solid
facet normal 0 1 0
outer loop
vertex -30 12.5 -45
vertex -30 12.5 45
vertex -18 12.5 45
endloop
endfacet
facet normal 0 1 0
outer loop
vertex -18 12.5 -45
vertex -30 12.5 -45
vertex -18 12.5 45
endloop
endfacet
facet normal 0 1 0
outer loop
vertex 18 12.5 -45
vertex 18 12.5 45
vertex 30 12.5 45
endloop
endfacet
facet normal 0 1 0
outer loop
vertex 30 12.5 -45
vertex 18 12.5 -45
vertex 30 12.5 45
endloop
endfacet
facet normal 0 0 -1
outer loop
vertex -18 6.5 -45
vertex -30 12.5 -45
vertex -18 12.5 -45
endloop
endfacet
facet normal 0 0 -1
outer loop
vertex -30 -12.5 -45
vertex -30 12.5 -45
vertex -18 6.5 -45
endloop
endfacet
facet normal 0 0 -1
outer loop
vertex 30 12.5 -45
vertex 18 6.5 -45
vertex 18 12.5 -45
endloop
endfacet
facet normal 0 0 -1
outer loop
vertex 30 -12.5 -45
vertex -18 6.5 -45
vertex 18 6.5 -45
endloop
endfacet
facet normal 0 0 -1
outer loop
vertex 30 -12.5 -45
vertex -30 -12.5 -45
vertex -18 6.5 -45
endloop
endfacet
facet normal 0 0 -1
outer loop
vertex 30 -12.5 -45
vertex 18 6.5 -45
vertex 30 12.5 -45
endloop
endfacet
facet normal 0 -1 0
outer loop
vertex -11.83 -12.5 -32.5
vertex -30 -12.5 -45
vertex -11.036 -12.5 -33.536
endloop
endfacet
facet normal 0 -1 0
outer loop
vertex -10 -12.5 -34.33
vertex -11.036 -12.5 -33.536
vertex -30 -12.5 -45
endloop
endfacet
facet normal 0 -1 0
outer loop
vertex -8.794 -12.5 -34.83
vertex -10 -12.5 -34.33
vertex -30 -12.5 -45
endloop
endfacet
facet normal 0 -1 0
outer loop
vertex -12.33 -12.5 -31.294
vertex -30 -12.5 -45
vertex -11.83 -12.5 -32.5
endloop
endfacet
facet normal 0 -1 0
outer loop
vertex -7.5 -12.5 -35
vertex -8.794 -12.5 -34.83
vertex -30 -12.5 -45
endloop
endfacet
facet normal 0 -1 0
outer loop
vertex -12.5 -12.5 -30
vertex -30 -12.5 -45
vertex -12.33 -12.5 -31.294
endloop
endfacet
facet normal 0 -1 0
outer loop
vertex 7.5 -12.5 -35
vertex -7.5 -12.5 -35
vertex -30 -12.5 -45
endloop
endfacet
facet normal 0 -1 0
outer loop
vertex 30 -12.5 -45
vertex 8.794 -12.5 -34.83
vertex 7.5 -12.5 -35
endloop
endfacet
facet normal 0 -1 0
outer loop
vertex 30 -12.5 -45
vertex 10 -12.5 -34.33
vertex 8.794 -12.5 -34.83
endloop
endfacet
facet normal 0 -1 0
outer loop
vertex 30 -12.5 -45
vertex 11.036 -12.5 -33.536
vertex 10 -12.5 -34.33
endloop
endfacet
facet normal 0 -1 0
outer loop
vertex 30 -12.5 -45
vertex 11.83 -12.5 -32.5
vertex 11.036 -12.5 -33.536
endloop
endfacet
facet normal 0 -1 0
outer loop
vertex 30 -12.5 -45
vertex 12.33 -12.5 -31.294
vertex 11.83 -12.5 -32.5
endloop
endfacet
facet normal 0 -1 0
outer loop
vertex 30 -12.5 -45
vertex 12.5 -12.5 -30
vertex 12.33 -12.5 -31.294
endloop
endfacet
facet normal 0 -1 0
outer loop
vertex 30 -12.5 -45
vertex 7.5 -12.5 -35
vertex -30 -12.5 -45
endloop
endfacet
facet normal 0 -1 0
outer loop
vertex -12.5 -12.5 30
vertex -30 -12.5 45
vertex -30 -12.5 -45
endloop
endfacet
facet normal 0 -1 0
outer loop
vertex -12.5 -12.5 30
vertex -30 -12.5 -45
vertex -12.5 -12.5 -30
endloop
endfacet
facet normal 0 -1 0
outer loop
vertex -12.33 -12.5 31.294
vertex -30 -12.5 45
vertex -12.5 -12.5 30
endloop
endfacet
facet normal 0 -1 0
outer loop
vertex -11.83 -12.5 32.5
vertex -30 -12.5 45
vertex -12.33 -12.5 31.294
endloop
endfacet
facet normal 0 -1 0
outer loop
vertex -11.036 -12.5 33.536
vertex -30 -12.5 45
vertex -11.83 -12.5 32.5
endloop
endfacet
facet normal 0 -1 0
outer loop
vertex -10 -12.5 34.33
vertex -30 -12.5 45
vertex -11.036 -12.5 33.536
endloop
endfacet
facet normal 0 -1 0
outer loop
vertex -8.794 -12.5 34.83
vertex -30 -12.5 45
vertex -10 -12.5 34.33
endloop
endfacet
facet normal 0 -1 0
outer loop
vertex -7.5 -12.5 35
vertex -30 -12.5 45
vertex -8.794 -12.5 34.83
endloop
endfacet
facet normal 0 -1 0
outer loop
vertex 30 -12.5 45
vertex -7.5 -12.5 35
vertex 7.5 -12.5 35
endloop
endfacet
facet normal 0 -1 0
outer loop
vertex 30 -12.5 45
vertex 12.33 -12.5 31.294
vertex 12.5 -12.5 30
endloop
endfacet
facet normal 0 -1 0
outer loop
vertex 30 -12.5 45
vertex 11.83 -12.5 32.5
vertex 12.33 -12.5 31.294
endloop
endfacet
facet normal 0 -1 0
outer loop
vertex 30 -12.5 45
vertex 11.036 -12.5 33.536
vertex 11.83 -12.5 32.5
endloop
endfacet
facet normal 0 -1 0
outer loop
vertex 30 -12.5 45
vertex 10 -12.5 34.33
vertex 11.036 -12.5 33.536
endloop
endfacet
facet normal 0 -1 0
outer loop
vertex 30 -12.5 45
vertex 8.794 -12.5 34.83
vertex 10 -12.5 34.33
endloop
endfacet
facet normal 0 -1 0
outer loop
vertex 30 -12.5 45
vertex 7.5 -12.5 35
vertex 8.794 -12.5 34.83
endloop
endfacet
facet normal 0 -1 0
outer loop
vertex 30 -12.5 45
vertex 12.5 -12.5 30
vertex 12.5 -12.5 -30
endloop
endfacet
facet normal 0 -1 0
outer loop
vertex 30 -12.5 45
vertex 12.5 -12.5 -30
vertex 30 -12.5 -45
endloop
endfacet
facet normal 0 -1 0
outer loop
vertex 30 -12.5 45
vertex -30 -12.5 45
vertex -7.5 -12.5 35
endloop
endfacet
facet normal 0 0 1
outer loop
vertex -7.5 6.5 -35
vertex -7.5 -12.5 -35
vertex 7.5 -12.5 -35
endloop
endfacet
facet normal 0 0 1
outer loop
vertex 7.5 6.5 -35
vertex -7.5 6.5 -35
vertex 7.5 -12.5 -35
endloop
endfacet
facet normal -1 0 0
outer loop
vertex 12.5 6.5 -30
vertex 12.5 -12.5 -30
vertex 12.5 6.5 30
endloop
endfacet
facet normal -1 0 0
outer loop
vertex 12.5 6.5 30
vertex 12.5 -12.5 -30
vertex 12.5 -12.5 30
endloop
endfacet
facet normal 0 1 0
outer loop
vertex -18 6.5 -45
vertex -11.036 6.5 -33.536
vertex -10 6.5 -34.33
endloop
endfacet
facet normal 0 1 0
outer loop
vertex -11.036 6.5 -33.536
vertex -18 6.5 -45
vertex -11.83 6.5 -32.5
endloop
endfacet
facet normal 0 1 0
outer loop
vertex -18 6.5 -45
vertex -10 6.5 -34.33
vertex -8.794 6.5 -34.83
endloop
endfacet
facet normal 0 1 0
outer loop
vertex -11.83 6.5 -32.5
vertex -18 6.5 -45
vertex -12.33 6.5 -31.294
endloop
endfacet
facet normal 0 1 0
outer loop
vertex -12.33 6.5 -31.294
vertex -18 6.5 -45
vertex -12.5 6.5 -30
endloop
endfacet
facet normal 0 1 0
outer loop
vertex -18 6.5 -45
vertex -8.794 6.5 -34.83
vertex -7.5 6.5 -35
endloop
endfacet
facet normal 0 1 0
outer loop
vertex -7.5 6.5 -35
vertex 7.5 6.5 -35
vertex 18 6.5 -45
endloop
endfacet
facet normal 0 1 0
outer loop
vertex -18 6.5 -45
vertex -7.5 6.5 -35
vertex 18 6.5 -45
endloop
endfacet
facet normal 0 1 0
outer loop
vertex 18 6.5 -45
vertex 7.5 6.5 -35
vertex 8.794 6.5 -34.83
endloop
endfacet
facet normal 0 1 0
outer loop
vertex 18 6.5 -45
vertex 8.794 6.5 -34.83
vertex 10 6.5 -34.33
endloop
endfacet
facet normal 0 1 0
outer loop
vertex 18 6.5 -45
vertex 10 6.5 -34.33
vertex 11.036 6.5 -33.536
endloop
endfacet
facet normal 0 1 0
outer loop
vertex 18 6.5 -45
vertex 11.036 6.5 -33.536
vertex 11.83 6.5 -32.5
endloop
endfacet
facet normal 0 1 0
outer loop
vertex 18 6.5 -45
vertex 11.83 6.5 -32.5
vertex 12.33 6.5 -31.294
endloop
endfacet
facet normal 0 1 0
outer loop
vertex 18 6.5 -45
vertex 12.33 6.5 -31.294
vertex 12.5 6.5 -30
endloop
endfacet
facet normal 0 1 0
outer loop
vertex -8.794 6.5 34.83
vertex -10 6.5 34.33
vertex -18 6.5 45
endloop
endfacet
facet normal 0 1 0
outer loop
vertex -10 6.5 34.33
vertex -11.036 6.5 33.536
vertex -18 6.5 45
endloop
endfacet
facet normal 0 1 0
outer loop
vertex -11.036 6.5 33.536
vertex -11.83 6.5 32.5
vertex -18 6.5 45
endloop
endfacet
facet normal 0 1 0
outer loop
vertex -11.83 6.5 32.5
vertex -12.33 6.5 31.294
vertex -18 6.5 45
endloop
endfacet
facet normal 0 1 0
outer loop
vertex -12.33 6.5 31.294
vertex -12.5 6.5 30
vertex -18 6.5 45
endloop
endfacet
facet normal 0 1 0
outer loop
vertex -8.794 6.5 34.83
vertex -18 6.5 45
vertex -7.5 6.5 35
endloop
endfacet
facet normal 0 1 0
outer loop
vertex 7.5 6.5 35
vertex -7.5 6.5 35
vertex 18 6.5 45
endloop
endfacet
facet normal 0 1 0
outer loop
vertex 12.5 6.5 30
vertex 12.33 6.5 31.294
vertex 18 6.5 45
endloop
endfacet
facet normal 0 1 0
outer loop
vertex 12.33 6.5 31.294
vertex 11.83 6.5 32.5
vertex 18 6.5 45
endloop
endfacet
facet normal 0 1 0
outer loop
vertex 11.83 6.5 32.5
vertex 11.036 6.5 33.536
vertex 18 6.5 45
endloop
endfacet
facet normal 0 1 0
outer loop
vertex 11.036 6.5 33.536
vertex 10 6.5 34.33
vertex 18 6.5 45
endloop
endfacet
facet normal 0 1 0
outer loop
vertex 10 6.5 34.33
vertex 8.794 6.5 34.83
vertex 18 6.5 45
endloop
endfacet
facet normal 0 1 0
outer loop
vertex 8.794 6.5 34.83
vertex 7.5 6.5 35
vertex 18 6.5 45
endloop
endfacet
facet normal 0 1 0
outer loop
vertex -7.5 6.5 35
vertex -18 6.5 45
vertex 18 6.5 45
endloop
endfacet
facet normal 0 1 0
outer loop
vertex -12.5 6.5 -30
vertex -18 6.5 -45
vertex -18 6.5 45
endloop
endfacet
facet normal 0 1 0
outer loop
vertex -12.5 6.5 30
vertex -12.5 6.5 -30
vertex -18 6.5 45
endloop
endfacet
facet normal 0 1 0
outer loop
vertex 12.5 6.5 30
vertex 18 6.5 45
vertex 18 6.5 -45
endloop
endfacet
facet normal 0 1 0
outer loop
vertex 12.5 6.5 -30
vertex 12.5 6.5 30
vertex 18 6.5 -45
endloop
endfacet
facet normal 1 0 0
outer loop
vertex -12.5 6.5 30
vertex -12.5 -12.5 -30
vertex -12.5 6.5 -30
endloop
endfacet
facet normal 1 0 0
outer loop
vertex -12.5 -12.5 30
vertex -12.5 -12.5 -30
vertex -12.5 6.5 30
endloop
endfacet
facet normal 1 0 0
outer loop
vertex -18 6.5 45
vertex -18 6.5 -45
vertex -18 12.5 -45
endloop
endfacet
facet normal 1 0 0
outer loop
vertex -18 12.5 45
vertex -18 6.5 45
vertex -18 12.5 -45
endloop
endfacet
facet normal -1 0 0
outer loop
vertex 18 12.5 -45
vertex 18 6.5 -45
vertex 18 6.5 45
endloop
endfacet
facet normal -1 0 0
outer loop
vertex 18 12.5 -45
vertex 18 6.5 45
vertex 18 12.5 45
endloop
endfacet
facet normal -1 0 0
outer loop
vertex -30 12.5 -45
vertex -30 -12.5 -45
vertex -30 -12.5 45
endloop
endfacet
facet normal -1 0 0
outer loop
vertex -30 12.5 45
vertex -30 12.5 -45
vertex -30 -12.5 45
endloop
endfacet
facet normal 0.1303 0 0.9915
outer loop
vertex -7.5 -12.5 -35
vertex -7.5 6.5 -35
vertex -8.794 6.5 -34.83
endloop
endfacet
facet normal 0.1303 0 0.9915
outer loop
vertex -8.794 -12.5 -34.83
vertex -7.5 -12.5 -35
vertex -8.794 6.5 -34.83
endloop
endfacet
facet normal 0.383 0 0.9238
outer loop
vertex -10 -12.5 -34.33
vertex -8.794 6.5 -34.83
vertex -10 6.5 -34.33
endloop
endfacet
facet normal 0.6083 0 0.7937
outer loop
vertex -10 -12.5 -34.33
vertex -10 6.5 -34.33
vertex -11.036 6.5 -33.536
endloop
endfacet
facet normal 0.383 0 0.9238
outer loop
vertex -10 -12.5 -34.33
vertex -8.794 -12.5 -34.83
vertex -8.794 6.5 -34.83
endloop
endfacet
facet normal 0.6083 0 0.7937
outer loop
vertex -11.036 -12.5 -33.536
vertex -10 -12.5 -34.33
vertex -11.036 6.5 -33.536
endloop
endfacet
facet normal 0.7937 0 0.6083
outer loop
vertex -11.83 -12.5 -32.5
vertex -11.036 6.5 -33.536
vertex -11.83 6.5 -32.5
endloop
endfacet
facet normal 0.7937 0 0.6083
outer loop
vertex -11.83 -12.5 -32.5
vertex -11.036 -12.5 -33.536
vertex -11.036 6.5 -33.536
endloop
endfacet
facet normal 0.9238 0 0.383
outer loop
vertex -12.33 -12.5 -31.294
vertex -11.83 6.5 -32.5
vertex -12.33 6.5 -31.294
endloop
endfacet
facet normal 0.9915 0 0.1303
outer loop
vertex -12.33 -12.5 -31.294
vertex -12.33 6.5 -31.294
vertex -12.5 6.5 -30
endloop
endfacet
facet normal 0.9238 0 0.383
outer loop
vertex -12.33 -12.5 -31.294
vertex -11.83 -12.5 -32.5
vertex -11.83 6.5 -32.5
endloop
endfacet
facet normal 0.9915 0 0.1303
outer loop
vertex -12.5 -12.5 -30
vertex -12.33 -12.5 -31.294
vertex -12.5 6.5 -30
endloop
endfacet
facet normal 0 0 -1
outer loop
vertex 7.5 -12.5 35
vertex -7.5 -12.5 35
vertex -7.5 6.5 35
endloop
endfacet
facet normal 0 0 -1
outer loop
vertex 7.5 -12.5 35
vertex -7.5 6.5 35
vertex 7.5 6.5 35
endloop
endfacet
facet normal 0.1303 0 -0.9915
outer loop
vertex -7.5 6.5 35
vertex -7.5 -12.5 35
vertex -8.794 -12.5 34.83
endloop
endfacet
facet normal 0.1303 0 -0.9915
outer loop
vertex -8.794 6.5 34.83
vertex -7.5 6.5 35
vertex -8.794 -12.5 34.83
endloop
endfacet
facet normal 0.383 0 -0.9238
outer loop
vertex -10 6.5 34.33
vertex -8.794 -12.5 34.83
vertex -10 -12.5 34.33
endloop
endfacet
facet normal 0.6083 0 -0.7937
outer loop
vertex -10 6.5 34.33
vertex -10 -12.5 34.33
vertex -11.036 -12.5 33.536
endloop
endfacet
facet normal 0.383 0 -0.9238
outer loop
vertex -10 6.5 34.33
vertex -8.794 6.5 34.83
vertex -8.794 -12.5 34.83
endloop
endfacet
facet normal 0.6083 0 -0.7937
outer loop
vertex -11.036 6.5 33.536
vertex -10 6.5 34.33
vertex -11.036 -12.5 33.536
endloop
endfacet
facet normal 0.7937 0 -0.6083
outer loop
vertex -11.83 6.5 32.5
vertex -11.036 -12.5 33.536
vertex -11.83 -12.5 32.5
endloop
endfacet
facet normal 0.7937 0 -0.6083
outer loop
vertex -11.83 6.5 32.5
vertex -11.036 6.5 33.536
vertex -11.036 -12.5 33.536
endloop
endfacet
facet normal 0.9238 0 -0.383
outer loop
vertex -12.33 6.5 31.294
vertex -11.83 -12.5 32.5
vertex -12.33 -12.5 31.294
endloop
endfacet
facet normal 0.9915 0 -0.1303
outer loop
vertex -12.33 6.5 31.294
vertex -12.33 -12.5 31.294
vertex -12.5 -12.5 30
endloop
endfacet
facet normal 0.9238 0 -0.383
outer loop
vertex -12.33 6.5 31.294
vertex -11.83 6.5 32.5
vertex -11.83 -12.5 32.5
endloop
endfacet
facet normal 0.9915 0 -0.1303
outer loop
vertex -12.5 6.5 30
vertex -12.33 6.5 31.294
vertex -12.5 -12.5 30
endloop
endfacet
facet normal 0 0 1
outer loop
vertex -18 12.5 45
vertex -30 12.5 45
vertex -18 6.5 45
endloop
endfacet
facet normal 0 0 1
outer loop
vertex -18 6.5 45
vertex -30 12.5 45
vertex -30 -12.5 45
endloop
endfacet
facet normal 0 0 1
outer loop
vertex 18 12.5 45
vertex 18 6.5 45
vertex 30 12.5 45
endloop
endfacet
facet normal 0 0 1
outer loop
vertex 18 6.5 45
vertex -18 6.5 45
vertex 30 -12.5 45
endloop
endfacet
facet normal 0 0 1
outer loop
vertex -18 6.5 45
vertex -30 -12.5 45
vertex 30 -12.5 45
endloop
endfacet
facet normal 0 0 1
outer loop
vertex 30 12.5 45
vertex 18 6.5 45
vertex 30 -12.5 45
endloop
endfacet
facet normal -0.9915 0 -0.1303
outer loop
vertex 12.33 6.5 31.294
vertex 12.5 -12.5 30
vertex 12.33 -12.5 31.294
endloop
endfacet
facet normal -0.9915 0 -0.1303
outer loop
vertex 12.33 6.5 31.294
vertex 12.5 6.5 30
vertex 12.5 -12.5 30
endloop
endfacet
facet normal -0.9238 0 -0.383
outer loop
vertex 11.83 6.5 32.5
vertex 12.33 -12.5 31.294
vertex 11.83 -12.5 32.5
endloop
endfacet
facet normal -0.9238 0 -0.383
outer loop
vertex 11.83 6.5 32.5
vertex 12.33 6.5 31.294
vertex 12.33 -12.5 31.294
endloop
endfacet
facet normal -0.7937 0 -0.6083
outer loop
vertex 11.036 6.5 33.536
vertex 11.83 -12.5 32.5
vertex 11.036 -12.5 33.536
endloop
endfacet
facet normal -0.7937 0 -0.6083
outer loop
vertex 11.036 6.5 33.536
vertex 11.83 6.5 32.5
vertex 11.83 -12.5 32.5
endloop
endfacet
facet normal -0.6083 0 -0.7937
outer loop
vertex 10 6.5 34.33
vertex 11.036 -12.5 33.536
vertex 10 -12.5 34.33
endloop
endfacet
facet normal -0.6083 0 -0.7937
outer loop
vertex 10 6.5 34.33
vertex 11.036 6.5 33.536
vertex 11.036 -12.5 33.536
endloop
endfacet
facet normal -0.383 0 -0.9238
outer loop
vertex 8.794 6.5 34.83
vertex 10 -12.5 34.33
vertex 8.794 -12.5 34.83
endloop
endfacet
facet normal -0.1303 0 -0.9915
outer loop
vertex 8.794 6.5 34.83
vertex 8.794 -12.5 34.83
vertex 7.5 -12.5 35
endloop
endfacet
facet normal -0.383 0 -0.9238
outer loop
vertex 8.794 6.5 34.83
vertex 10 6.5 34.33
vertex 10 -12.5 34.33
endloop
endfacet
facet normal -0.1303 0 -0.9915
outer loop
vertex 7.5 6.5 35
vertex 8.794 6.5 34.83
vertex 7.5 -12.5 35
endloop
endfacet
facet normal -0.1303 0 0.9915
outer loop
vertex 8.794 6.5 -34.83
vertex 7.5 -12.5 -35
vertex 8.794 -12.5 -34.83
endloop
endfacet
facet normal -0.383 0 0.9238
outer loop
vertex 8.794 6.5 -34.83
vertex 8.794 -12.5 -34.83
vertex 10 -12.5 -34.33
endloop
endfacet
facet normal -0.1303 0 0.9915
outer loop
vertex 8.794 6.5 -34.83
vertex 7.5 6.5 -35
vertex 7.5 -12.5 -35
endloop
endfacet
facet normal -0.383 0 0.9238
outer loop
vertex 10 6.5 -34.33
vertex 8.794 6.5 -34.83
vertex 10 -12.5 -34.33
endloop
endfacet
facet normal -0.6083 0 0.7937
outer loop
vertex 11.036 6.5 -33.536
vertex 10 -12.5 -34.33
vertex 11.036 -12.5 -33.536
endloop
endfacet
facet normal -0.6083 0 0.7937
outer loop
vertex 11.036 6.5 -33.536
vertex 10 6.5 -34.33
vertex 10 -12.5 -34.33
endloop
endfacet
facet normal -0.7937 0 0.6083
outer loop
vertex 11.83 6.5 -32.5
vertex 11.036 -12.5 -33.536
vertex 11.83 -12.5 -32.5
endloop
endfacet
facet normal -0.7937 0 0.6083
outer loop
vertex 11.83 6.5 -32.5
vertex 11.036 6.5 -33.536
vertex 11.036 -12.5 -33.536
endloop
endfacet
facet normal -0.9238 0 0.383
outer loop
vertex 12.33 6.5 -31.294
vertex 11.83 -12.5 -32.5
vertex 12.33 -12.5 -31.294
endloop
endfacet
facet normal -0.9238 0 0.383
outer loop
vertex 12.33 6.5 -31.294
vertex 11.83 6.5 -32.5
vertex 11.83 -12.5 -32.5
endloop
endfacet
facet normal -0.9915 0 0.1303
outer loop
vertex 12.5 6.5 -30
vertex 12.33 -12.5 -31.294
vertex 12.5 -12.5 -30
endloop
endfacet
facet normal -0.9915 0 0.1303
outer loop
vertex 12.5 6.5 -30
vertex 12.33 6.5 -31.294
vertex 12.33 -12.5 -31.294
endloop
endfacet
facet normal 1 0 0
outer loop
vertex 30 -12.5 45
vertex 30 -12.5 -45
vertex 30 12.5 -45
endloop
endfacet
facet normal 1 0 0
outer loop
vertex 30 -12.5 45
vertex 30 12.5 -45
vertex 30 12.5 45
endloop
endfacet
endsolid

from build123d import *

# Parameters (mm, degrees)
F0_W     = 60
F0_H     = 90
F0_W_2   = 25
F0_H_2   = 70
F1_DEPTH = 12.5
F2_W     = 36
F2_H     = 6
F3_DEPTH = 90.001
F4_R     = 5


with BuildPart() as f1:
    # F0 (on Front) → F1 (new body, symmetric)
    with BuildSketch(Plane.XZ):
        Rectangle(F0_W, F0_H)
        Rectangle(F0_W_2, F0_H_2, mode=Mode.SUBTRACT)
    extrude(amount=F1_DEPTH, both=True)

    # F2 (on face) → F3 (cut, through all)
    with BuildSketch(Plane.XY.offset(45)):
        with Locations((0, 9.5)):
            Rectangle(F2_W, F2_H)
    extrude(amount=-F3_DEPTH, mode=Mode.SUBTRACT)

    # F4
    f4_edges = [f1.edges().sort_by_distance(p)[0] for p in [
        (-12.5, -3, 35),
        (12.5, -3, 35),
        (12.5, -3, -35),
        (-12.5, -3, -35),
    ]]
    fillet(f4_edges, radius=F4_R)


solid = f1.part
